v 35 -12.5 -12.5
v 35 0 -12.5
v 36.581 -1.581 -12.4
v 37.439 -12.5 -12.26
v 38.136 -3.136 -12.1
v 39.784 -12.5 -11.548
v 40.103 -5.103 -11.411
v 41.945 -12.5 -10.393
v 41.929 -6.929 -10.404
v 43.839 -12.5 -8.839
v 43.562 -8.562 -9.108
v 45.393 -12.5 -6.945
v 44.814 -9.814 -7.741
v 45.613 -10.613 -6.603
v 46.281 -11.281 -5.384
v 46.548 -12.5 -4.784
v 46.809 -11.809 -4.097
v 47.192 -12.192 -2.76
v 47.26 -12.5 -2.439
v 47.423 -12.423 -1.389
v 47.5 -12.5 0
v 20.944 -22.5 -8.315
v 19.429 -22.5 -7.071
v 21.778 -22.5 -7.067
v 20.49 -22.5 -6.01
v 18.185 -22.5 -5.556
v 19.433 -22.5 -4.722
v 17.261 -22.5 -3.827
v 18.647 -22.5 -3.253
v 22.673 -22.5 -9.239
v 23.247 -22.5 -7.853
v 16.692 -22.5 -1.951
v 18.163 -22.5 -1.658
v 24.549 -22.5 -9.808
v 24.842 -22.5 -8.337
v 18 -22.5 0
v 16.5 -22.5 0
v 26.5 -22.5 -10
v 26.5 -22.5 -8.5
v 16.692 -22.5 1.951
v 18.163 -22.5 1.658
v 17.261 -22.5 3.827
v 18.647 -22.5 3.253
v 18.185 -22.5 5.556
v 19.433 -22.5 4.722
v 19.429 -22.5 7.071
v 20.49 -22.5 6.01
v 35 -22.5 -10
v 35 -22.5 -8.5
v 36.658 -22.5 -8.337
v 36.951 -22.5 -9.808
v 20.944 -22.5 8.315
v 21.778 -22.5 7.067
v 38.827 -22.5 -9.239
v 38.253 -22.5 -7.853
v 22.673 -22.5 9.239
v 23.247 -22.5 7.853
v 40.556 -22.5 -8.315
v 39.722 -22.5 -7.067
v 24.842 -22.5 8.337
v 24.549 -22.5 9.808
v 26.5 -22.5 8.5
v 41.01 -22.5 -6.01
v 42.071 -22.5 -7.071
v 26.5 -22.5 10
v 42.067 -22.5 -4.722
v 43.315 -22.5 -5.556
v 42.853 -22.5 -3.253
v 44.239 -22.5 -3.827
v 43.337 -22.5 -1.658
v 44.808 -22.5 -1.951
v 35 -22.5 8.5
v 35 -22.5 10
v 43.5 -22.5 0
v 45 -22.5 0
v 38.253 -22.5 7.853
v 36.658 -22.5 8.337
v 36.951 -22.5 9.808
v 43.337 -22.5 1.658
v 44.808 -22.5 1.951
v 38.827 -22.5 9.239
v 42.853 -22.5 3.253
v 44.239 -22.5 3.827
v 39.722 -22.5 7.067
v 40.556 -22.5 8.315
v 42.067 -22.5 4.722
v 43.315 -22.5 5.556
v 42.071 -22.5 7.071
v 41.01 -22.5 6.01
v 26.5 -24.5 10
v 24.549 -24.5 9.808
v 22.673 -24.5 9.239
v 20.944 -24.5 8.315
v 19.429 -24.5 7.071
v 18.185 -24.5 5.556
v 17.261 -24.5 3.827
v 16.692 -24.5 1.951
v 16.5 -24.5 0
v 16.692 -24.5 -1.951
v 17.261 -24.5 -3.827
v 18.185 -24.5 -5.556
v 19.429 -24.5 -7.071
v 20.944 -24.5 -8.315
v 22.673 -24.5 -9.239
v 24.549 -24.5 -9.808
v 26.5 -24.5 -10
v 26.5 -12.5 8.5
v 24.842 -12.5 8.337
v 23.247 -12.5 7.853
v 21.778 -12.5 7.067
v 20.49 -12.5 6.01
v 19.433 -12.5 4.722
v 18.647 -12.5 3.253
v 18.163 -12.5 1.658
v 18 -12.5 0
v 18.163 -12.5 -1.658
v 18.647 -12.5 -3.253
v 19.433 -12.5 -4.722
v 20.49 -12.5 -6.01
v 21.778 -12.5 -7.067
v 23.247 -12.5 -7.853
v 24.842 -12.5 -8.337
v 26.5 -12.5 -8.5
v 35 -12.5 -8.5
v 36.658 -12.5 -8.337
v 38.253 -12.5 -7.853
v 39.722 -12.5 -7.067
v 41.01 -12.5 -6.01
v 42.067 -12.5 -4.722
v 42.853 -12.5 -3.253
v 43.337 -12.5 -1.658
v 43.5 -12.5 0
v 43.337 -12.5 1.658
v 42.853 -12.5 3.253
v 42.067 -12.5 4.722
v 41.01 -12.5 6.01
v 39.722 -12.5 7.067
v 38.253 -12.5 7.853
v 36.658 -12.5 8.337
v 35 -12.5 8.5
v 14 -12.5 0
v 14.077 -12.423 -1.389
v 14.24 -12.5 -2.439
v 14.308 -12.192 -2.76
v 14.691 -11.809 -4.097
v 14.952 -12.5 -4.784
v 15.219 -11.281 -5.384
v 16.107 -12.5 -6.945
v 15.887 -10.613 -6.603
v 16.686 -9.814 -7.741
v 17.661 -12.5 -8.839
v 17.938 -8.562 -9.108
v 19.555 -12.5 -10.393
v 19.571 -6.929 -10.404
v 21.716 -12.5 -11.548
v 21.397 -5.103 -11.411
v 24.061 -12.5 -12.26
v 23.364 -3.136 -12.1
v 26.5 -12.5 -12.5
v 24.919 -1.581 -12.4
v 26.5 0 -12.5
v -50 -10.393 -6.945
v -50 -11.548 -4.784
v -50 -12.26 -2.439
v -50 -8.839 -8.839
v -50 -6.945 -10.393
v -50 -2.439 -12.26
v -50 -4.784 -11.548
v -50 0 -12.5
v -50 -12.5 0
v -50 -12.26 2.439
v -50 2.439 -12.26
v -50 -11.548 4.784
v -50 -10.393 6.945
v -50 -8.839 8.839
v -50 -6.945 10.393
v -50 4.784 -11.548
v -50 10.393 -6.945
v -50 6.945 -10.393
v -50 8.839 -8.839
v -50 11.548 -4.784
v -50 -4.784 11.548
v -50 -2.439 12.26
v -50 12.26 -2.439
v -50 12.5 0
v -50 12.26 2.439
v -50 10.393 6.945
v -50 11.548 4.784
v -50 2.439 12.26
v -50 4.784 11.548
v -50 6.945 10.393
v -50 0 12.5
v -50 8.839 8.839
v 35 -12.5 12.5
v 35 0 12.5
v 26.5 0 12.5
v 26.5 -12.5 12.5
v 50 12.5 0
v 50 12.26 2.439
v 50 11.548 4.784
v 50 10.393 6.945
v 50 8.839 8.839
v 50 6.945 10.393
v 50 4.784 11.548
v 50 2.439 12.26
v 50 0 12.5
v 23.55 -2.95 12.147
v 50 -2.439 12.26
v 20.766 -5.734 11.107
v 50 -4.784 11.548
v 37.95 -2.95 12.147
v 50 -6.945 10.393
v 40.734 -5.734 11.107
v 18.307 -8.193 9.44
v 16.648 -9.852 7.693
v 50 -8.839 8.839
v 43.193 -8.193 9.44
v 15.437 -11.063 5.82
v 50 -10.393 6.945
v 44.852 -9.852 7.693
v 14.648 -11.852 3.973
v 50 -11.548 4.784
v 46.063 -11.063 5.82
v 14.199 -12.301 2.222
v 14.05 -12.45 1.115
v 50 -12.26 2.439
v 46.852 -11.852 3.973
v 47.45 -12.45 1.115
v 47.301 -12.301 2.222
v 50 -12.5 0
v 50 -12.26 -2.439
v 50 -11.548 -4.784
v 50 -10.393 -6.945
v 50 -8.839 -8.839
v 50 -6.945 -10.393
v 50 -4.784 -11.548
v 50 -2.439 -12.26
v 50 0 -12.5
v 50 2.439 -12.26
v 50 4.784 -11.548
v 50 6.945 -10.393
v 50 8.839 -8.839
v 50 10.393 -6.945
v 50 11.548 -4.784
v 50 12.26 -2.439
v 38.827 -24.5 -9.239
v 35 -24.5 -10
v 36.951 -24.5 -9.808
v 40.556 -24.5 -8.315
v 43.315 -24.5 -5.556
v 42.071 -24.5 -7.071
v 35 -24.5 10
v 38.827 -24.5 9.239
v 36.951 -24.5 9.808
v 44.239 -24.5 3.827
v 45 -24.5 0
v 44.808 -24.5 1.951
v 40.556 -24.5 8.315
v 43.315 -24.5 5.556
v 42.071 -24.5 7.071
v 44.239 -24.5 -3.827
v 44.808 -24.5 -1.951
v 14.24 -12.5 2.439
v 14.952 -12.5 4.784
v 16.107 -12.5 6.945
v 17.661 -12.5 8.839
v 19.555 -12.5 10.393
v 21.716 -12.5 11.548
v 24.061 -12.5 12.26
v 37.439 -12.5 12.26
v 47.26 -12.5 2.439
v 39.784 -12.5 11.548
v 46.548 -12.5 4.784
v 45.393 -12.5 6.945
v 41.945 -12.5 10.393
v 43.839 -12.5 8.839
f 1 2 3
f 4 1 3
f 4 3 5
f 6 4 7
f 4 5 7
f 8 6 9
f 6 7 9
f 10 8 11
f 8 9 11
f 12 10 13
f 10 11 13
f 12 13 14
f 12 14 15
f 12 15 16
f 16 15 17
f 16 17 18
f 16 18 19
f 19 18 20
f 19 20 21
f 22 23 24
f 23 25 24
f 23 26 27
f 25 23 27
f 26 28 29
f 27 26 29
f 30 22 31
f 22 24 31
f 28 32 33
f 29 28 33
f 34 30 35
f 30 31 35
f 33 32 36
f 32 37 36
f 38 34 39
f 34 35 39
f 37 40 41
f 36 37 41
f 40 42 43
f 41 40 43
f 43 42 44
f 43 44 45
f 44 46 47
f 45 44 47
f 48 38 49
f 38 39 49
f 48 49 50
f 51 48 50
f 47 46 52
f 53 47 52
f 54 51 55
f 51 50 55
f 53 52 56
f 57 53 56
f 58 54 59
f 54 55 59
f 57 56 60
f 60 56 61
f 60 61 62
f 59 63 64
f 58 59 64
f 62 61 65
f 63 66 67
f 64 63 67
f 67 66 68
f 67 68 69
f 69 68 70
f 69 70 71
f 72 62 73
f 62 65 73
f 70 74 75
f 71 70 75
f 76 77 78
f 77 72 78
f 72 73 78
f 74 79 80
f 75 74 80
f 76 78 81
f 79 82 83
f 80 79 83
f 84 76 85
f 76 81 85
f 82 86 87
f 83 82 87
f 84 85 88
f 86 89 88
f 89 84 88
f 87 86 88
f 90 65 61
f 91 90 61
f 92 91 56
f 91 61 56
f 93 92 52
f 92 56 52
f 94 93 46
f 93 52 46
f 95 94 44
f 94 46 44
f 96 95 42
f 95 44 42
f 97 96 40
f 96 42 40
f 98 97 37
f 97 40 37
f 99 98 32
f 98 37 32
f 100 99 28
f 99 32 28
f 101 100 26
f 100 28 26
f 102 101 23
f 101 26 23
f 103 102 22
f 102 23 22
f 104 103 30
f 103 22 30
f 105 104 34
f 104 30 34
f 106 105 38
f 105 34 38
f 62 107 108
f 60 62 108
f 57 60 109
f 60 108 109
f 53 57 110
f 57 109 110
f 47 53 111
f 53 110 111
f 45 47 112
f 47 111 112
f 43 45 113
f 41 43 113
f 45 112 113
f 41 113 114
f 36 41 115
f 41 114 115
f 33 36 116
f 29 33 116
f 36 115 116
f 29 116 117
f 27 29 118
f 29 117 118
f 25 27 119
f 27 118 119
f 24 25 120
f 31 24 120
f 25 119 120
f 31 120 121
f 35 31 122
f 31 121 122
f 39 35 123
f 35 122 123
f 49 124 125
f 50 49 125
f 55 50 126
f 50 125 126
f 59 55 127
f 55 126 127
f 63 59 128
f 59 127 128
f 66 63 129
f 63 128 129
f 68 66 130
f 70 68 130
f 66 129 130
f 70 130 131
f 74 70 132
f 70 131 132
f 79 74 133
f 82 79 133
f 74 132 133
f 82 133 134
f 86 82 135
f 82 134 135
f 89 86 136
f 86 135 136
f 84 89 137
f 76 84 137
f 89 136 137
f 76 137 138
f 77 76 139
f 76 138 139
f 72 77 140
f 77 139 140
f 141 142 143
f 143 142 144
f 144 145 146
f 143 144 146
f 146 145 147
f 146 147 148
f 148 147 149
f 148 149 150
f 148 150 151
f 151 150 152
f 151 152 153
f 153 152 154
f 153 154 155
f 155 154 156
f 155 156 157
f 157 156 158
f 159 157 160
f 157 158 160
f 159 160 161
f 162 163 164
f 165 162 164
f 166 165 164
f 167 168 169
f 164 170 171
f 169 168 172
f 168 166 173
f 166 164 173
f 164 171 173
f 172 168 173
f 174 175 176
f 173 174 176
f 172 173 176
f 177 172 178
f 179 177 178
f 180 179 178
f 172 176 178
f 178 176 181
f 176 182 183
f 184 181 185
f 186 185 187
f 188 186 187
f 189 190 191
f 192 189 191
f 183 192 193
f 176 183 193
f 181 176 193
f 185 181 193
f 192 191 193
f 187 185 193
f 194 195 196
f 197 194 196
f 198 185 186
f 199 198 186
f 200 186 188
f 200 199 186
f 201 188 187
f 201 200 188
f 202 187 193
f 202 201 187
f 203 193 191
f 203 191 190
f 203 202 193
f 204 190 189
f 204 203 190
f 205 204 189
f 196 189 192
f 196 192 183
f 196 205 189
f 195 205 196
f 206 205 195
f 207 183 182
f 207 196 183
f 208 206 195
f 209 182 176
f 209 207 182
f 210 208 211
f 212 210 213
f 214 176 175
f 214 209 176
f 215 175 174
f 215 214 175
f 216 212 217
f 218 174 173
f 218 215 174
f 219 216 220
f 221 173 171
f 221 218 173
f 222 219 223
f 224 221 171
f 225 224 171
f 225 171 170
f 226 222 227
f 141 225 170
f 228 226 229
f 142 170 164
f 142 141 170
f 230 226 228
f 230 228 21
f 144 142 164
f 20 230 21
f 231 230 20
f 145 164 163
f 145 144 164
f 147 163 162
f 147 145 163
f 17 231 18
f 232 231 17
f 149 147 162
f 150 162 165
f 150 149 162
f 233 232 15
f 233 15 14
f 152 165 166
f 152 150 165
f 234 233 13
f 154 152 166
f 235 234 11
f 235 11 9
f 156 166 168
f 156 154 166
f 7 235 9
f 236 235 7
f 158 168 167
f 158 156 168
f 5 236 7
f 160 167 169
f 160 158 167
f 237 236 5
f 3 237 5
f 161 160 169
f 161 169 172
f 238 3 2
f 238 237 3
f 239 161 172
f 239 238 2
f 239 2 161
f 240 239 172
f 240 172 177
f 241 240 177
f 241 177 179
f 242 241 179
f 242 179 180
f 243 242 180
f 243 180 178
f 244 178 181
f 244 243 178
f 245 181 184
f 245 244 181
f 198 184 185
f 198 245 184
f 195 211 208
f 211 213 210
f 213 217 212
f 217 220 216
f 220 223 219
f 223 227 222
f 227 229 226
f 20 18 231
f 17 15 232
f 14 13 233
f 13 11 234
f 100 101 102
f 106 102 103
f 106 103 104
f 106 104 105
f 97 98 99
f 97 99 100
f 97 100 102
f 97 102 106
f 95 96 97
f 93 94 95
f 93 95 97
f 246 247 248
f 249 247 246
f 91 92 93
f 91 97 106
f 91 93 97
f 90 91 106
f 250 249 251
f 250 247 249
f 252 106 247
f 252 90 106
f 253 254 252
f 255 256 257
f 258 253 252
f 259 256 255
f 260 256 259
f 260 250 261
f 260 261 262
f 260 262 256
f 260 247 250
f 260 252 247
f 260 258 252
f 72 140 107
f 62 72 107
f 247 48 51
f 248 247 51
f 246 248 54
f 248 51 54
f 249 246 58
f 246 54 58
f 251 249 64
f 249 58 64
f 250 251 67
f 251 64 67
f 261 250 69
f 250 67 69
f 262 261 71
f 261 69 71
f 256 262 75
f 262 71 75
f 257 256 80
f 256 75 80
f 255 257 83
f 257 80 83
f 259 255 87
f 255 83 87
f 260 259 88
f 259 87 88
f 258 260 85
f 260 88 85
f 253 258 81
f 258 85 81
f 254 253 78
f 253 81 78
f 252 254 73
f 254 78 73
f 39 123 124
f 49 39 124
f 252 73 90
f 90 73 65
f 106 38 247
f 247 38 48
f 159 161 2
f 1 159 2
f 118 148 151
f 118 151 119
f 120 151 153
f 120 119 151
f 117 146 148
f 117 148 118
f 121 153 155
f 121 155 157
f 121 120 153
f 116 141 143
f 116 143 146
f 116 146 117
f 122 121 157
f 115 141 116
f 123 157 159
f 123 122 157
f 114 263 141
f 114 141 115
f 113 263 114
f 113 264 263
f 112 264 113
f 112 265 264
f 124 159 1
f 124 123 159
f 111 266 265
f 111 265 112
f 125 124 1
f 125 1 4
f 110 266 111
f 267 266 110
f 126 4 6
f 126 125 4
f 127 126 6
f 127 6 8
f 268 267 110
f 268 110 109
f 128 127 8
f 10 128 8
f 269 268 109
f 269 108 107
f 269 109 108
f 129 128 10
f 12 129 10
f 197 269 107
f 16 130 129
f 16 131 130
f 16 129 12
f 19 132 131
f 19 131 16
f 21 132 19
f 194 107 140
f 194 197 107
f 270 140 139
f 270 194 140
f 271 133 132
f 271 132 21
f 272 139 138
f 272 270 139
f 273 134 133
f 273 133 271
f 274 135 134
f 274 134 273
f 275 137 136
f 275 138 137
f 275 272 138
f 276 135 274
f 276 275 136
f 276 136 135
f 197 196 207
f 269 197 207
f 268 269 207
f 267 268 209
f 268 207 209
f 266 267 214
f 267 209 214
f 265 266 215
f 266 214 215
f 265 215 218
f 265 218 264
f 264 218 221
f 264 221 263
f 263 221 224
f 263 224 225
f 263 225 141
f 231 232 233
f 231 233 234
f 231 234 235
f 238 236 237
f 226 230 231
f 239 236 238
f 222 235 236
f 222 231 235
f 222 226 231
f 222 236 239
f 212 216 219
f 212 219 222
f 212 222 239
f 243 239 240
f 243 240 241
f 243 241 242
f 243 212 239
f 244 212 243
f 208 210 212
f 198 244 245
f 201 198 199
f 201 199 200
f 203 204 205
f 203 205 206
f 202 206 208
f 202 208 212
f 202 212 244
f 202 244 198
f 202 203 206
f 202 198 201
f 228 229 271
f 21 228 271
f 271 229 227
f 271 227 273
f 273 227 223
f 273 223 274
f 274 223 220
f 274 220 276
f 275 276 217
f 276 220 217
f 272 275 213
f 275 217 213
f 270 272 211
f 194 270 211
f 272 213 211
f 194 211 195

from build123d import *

# Parameters (mm, degrees)
F0_R     = 12.5
F1_DEPTH = 50
F3_DEPTH = 12.5
F5_DEPTH = 10
F7_DEPTH = 2


with BuildPart() as f1:
    # F0 (on Right) → F1 (new body, symmetric)
    with BuildSketch(Plane.YZ):
        Circle(F0_R)
    extrude(amount=F1_DEPTH, both=True)

    # F2 (on Front) → F3 (join)
    with BuildSketch(Plane.XZ):
        with BuildLine():
            Line((35, 12.5), (26.5, 12.5))
            ThreePointArc((26.5, 12.5), (14, 0), (26.5, -12.5))
            Line((26.5, -12.5), (35, -12.5))
            ThreePointArc((35, -12.5), (47.5, 0), (35, 12.5))
        make_face()
    extrude(amount=F3_DEPTH)

    # F4 (on face) → F5 (join)
    with BuildSketch(Plane.XZ.offset(12.5)):
        with BuildLine():
            Line((35, 8.5), (26.5, 8.5))
            ThreePointArc((26.5, 8.5), (18, 0), (26.5, -8.5))
            Line((26.5, -8.5), (35, -8.5))
            ThreePointArc((35, -8.5), (43.5, 0), (35, 8.5))
        make_face()
    extrude(amount=F5_DEPTH)

    # F6 (on face) → F7 (join)
    with BuildSketch(Plane.XZ.offset(22.5)):
        with BuildLine():
            Line((35, 10), (26.5, 10))
            ThreePointArc((26.5, 10), (16.5, 0), (26.5, -10))
            Line((26.5, -10), (35, -10))
            ThreePointArc((35, -10), (45, 0), (35, 10))
        make_face()
    extrude(amount=F7_DEPTH)


solid = f1.part
